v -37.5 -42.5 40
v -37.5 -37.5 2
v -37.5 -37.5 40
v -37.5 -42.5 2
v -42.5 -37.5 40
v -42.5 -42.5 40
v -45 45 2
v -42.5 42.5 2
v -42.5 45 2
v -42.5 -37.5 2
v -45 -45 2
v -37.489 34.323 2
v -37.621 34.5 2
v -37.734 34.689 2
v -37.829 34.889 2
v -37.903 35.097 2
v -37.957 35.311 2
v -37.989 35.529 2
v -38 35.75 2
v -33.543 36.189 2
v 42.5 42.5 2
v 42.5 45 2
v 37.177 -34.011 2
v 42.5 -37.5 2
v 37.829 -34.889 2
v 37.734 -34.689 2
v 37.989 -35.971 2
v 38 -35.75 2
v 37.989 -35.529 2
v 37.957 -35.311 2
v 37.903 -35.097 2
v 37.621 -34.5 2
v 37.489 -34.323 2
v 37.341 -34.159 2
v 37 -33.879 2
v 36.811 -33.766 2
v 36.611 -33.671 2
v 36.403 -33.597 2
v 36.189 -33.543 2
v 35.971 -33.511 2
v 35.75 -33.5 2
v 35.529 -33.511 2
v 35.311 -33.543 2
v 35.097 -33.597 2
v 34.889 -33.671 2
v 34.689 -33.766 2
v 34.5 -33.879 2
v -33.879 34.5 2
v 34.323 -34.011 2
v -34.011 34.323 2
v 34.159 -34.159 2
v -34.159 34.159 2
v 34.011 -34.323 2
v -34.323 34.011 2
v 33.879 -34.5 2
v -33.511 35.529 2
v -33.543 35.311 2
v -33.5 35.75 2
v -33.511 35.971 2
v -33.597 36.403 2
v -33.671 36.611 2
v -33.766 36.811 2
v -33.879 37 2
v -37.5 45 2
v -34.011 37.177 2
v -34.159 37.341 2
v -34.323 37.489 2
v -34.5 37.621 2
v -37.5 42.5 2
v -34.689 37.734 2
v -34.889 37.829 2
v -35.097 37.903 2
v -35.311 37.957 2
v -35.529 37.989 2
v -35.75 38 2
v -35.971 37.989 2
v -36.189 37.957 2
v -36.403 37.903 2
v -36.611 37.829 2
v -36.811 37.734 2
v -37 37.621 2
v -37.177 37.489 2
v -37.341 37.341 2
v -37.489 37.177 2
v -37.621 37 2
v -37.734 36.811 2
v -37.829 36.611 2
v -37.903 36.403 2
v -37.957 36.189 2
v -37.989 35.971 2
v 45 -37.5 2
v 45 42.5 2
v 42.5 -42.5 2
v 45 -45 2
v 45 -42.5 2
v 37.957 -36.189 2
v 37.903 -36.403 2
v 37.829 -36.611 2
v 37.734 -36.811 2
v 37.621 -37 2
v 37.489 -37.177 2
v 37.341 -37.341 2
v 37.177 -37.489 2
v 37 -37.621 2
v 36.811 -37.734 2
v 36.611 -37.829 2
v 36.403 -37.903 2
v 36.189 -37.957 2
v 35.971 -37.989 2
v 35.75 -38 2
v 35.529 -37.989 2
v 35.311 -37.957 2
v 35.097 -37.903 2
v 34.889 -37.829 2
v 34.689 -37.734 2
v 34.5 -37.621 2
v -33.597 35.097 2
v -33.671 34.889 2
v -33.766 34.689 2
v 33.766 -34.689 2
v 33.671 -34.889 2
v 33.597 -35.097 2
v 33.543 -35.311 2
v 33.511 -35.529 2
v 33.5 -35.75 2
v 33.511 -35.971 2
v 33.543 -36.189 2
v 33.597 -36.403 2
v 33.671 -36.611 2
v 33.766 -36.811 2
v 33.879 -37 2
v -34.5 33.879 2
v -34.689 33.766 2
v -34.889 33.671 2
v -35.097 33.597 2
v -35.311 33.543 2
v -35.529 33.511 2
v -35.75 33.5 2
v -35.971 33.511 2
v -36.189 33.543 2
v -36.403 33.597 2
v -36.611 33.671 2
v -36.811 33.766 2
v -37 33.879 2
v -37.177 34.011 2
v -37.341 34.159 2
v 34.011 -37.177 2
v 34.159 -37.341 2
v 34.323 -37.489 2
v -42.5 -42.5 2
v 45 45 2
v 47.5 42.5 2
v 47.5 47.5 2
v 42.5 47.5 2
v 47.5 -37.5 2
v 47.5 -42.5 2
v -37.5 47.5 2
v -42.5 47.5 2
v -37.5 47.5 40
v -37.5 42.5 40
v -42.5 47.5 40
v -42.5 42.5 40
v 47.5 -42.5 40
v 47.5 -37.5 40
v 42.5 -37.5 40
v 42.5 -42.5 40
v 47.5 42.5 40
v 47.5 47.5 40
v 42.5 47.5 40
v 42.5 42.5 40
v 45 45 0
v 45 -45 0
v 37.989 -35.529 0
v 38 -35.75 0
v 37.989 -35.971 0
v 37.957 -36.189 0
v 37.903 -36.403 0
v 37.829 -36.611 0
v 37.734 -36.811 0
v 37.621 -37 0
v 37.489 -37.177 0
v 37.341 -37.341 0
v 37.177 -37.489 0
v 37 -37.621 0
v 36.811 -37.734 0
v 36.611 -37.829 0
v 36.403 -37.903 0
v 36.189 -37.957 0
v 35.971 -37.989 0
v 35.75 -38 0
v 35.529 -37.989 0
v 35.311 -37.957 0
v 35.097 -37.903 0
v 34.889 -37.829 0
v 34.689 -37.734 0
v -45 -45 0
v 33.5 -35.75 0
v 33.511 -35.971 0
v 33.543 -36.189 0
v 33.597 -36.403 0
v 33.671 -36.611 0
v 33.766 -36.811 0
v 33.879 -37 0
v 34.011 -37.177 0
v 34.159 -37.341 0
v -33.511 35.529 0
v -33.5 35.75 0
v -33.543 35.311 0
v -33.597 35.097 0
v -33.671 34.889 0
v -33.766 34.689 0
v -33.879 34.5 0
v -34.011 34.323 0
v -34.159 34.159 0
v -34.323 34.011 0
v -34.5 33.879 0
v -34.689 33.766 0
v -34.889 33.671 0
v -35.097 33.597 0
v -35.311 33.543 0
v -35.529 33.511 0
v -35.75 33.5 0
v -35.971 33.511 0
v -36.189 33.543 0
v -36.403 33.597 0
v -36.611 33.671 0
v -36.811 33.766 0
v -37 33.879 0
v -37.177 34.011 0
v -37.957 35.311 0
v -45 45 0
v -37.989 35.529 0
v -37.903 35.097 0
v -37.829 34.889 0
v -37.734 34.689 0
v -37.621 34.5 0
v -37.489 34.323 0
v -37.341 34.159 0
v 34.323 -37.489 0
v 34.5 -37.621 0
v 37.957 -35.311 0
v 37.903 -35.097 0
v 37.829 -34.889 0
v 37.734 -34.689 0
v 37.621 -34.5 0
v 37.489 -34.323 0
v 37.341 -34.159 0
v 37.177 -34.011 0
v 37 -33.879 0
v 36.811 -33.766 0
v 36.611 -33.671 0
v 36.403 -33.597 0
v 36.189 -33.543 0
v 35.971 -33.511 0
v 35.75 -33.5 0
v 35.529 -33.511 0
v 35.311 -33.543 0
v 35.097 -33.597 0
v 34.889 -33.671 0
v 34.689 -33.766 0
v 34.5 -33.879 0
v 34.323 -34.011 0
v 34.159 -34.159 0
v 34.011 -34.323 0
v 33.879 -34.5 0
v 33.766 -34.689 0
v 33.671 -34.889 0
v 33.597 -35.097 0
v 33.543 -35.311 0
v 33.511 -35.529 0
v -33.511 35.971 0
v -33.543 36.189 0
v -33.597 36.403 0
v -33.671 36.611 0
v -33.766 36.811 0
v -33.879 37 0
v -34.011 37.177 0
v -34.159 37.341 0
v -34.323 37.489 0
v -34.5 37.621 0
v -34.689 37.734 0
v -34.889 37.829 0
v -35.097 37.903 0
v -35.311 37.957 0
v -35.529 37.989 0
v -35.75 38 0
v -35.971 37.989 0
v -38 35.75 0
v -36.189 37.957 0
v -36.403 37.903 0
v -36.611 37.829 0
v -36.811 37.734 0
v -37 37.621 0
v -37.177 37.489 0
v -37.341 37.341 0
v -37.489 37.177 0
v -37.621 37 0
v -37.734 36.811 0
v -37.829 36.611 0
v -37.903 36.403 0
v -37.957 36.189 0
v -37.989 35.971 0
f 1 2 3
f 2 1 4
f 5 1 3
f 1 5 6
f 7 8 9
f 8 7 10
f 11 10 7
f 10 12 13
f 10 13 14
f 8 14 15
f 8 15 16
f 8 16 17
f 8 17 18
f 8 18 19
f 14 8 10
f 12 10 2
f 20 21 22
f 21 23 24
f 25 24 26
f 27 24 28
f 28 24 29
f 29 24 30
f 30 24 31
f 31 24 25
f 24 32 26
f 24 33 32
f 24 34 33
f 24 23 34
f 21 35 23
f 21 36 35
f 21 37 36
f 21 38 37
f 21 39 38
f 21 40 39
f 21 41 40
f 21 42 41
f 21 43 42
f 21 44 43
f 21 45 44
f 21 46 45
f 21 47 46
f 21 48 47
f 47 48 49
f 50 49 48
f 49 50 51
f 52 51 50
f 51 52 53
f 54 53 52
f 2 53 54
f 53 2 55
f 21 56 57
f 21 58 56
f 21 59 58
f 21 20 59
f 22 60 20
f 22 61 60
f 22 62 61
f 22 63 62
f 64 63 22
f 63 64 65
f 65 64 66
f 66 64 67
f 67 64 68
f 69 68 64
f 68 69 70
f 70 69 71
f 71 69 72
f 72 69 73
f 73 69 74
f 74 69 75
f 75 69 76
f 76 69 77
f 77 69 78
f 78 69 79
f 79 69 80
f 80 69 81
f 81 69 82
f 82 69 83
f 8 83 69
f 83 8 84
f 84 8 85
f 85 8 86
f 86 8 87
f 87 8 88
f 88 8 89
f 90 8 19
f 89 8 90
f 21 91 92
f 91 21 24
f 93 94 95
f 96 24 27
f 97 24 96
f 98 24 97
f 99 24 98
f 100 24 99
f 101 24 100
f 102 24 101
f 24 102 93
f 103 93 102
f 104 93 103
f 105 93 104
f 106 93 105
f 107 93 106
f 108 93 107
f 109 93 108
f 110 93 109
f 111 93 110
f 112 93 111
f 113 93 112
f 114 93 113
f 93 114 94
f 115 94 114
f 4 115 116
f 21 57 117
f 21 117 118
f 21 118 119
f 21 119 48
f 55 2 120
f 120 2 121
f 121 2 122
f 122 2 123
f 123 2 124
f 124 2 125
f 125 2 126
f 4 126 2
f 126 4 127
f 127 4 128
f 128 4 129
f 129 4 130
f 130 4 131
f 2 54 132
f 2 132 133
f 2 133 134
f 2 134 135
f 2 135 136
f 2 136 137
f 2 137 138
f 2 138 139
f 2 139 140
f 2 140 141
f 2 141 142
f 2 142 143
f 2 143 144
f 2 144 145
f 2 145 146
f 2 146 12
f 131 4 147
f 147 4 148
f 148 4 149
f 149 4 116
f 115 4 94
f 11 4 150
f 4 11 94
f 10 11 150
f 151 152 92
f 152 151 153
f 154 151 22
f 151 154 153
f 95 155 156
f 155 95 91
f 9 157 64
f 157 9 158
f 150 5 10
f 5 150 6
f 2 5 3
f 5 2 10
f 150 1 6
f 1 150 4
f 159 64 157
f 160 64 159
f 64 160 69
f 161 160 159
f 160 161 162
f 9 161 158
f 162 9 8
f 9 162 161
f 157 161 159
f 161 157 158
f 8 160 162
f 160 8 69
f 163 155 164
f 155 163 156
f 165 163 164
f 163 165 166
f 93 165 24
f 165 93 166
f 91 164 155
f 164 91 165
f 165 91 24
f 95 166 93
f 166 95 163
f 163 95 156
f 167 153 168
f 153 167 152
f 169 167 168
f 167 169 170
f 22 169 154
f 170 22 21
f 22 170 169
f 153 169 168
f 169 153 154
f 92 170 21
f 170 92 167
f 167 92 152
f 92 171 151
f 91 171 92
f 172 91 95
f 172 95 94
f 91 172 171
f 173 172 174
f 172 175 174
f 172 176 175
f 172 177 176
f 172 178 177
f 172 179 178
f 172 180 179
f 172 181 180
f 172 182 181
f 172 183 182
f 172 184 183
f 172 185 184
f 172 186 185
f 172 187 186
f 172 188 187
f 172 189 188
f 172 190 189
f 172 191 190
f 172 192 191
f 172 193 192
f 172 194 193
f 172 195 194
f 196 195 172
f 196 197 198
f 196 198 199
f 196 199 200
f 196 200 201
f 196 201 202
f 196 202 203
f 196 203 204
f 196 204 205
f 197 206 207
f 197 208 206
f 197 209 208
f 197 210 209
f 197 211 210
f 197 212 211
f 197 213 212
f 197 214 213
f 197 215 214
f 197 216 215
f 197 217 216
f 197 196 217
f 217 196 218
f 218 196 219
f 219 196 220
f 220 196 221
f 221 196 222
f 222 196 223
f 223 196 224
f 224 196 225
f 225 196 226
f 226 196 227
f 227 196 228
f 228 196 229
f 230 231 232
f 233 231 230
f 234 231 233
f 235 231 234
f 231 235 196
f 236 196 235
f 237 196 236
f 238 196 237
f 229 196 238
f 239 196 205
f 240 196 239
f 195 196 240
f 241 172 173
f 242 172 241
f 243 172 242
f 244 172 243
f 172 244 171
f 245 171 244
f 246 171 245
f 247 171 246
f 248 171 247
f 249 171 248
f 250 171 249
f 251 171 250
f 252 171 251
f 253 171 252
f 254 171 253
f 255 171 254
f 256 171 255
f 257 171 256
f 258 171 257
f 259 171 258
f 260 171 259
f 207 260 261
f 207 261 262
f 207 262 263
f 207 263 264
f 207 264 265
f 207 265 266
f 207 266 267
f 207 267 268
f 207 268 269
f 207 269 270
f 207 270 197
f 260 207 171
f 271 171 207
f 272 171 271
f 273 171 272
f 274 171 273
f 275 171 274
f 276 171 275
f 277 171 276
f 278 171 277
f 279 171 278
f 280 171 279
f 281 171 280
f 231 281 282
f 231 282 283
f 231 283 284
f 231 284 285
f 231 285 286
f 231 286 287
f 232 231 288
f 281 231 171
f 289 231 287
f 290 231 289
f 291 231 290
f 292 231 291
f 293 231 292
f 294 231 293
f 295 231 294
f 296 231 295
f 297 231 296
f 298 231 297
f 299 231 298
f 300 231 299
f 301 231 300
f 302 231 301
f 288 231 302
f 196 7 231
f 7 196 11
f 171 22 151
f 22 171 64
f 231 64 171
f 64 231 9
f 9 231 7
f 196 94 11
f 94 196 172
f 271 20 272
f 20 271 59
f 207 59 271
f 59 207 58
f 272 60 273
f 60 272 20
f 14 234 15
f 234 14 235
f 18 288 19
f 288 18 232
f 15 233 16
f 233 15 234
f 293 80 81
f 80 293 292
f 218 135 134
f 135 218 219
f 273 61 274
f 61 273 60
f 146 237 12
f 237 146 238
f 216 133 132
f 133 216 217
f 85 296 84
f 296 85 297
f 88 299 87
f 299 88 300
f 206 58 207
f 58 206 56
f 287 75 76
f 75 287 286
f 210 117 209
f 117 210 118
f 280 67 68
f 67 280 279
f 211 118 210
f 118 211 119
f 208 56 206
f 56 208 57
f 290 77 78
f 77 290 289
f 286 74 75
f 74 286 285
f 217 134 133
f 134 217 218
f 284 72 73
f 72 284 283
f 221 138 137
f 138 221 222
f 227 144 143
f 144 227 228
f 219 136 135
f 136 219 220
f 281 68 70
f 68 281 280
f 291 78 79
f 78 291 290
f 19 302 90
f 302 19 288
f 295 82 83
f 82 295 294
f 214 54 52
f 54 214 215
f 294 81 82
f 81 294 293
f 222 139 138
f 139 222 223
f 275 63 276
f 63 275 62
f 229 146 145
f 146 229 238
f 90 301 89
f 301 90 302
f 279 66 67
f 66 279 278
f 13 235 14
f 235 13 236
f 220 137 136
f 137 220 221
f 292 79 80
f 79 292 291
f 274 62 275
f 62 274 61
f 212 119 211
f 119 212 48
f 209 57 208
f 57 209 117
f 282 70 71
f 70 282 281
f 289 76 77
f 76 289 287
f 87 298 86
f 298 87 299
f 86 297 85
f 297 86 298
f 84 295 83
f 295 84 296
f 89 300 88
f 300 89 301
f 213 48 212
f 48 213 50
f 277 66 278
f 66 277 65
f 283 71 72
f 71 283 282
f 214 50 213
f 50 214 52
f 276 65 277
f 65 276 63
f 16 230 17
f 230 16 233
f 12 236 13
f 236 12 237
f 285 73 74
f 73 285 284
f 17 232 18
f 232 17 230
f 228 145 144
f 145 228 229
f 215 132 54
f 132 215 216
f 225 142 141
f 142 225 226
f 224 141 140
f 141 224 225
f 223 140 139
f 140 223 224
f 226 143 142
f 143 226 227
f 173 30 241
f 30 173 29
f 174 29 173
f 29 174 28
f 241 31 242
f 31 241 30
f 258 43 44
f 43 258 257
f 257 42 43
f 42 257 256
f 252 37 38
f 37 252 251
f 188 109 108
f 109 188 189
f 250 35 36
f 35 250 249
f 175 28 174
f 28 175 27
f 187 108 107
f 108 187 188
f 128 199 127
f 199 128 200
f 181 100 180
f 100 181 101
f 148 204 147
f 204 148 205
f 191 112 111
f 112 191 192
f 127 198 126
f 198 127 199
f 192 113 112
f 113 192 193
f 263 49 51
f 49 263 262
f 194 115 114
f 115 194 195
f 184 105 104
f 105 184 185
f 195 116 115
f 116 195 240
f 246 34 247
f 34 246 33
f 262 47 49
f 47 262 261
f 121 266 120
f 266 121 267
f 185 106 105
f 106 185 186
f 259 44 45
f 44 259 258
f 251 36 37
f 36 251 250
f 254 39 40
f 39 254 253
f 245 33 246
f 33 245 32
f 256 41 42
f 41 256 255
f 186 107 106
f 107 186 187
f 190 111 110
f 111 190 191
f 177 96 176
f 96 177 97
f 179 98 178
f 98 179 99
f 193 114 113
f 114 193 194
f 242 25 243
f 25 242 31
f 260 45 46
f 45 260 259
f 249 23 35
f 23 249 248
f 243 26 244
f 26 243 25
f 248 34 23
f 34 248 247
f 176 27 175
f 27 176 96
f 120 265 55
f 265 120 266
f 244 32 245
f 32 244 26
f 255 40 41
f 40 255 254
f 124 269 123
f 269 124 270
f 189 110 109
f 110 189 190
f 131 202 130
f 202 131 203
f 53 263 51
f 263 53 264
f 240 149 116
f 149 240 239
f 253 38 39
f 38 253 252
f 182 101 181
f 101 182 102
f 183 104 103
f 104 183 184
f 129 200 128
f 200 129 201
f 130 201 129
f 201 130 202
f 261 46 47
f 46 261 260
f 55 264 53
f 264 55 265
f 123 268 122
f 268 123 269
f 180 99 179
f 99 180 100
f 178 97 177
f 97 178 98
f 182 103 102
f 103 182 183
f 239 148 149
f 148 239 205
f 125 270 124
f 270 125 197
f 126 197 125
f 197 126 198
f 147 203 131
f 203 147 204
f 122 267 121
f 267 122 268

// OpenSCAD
// DIY magnetic stirrer housing for 80 mm PC case fan
// Print orientation: top plate down on the bed, walls pointing up (+Z)
// (the part is upside down relative to its use as a stirring cover)

$fn = 64;

// ---- Dimensions (mm) ----
outer_size     = 90;    // outer size of top plate (X x Y)
plate_thick    = 2;     // top plate thickness (z = 0 to 2)
wall_thick     = 2.5;   // wall thickness (z = 2 to 40)
box_height     = 40;    // height of open top from bed (walls rise to z = 40)

hole_d         = 4.5;   // M4 screw hole diameter
hole_pattern   = 71.5;  // square pitch of screw holes (X and Y)
hole_count     = 4;     // number of screw holes

notch_width    = 12;    // power cable notch width (along X)
notch_depth    = 8;     // notch depth from open edge (z = 32 to 40)

eps            = 0.5;   // overshoot for clean boolean cuts

// ---- Model ----
difference() {
    union() {
        // Top plate (lies flat on the bed)
        translate([-outer_size/2, -outer_size/2, 0])
            cube([outer_size, outer_size, plate_thick]);

        // Four vertical walls rising from the plate to z = box_height
        for (sx = [-1, 1], sy = [-1, 1])
            translate([sx * (outer_size/2 - wall_thick),
                       sy * (outer_size/2 - wall_thick),
                       plate_thick])
                cube([2 * wall_thick, 2 * wall_thick, box_height - plate_thick]);
    }

    // Screw holes through the top plate on a centred square pattern
    for (i = [0 : hole_count - 1]) {
        x = (i % 2 == 0) ? -hole_pattern/2 : hole_pattern/2;
        y = (i % 2 == 1) ? -hole_pattern/2 : hole_pattern/2;
        translate([x, y, -eps])
            cylinder(d = hole_d, h = plate_thick + 2 * eps);
    }

    // Power cable notch in one wall: 12 mm wide, centred along the wall,
    // reaching 8 mm down from the open edge (z = 32 to 40)
    translate([-notch_width/2, -notch_width/2, box_height - notch_depth])
        cube([notch_width, notch_width, notch_depth + eps]);
}
